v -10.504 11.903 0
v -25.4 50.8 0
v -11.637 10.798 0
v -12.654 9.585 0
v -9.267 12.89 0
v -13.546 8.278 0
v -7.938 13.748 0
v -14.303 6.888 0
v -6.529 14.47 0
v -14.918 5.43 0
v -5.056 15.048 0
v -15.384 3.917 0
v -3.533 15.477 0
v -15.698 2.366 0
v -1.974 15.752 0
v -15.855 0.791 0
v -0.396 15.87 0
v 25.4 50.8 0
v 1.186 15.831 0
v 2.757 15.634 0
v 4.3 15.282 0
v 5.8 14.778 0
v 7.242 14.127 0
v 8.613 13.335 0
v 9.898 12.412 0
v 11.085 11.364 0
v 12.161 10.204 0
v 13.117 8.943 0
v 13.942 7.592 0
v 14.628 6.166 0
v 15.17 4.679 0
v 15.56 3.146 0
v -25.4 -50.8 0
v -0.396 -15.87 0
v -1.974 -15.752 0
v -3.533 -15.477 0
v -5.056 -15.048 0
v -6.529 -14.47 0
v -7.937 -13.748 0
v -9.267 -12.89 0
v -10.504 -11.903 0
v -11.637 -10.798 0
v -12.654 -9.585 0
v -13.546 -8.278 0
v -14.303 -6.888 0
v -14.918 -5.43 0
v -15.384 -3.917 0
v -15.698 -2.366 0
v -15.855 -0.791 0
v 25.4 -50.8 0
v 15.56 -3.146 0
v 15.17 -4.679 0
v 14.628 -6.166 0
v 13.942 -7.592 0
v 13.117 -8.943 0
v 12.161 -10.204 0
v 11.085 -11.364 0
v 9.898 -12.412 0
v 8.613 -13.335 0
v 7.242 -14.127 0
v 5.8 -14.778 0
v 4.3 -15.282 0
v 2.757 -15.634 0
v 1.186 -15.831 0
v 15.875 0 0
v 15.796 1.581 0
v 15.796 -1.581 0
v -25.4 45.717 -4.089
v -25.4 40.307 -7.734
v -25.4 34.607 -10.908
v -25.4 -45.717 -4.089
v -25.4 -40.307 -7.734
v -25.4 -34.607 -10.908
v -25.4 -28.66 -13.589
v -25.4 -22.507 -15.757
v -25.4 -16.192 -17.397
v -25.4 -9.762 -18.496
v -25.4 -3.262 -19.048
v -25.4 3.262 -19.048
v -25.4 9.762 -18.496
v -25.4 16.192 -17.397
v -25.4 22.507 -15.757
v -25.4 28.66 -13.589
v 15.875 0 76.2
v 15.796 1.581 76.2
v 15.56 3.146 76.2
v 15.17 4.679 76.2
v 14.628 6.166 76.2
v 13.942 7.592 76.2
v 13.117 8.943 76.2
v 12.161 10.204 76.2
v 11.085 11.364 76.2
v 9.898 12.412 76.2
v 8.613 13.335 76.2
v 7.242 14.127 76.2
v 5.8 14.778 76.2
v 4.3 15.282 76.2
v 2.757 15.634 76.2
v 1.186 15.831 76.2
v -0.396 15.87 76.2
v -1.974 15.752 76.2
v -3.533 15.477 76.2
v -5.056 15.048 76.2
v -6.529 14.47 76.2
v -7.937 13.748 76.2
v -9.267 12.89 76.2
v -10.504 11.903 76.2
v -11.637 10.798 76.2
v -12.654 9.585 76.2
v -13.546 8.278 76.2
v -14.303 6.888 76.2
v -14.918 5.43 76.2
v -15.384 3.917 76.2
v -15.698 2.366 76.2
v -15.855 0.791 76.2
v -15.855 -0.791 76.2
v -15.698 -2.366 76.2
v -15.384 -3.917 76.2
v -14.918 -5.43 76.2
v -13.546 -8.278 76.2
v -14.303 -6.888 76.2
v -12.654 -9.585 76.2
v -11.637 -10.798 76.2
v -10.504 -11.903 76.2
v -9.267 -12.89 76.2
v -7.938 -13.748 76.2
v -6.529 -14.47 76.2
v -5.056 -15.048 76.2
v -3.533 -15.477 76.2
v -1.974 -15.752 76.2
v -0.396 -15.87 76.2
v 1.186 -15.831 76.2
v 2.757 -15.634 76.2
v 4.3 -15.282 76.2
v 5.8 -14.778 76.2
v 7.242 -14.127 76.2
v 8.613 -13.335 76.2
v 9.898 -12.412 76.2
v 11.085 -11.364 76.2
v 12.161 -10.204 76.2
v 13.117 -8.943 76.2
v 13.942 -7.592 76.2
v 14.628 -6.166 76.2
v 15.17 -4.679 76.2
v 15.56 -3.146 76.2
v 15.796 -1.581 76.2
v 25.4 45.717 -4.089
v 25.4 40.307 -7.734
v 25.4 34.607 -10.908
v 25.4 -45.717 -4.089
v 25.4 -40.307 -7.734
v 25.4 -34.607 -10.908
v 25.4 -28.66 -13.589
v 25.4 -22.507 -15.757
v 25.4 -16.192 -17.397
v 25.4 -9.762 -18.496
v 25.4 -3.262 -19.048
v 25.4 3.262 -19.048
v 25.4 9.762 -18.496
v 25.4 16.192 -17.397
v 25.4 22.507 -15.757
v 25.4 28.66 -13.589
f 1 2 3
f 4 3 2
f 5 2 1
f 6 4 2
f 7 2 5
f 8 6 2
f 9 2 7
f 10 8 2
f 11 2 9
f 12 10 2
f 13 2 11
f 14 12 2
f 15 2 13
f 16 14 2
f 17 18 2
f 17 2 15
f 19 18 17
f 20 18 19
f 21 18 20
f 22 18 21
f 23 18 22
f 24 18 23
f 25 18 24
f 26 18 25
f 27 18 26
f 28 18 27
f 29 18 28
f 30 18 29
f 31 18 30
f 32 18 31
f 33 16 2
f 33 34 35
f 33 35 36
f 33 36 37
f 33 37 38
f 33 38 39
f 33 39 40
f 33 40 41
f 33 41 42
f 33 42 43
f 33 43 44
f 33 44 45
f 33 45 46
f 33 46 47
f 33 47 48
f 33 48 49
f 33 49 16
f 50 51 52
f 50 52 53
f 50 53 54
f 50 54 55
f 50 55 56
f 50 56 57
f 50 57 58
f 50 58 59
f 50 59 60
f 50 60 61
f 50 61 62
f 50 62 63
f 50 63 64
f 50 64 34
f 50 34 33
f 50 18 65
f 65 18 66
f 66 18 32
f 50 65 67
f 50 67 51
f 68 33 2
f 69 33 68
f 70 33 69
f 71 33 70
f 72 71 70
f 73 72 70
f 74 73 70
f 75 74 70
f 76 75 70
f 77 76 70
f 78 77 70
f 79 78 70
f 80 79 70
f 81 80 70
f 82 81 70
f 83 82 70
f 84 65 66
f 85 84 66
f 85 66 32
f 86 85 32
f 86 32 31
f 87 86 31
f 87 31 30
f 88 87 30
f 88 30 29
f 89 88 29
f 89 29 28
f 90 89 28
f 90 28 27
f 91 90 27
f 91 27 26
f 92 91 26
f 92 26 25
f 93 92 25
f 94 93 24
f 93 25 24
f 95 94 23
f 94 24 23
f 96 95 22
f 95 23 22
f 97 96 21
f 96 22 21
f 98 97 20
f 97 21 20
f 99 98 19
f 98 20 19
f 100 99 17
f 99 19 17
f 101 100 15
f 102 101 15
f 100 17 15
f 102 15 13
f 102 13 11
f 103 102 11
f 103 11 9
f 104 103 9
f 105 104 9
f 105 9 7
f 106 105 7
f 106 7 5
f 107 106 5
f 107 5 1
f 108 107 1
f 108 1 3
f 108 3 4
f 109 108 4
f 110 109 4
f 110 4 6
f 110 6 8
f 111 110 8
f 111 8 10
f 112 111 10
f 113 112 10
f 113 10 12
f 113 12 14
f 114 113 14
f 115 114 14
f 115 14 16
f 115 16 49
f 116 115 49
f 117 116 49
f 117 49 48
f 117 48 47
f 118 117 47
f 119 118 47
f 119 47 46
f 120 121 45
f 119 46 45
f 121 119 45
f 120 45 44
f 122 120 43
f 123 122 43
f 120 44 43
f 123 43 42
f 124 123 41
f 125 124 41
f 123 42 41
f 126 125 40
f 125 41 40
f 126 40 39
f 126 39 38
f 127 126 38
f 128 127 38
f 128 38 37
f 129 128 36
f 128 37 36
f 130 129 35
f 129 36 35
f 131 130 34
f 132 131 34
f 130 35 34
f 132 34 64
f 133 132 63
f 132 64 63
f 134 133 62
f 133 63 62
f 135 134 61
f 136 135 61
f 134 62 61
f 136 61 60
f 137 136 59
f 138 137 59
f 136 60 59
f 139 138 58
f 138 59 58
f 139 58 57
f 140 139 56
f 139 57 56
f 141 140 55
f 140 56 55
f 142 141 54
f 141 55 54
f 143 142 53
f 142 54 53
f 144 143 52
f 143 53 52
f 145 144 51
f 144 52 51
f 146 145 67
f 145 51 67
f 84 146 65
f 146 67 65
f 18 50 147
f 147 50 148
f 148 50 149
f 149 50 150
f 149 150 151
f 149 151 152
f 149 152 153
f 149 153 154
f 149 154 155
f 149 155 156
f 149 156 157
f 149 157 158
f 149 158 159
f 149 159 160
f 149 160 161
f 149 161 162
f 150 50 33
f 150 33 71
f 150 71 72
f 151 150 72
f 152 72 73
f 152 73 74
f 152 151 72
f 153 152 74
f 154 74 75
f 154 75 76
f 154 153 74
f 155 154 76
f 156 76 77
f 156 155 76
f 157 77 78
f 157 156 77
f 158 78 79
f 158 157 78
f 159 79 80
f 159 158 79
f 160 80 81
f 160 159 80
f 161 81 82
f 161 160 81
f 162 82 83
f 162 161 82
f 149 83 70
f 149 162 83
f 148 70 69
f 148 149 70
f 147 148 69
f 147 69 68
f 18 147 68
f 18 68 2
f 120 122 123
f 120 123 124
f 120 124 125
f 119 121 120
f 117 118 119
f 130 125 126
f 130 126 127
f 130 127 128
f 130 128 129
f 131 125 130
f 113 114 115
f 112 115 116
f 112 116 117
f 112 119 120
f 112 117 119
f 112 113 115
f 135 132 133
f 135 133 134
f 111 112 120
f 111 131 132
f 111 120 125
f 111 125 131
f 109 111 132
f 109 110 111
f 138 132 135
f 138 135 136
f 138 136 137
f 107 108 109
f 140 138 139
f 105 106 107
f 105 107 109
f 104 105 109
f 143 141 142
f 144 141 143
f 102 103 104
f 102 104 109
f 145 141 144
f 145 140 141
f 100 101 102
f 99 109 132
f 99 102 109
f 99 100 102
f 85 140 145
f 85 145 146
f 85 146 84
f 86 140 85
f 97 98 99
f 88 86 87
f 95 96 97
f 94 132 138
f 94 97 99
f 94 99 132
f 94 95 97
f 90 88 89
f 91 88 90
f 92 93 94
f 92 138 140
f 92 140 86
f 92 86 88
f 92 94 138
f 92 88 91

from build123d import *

# Parameters (mm, degrees)
F0_R     = 15.875
F1_DEPTH = 76.2
F3_DEPTH = 25.4
F4_DEPTH = 25.4


with BuildPart() as f1:
    # F0 (on Top) → F1 (new body)
    with BuildSketch(Plane.XY):
        Circle(F0_R)
    extrude(amount=F1_DEPTH)

    # F2 (on Right) → F3 (join)
    with BuildSketch(Plane.YZ):
        with BuildLine():
            Line((50.8, 0), (0, 0))
            Line((0, 0), (-50.8, 0))
            ThreePointArc((-50.8, 0), (0, -19.117184), (50.8, 0))
        make_face()
    extrude(amount=F3_DEPTH)

    # F2 (on Right) → F4 (join)
    with BuildSketch(Plane.YZ):
        with BuildLine():
            Line((50.8, 0), (0, 0))
            Line((0, 0), (-50.8, 0))
            ThreePointArc((-50.8, 0), (0, -19.117184), (50.8, 0))
        make_face()
    extrude(amount=-F4_DEPTH)


solid = f1.part
